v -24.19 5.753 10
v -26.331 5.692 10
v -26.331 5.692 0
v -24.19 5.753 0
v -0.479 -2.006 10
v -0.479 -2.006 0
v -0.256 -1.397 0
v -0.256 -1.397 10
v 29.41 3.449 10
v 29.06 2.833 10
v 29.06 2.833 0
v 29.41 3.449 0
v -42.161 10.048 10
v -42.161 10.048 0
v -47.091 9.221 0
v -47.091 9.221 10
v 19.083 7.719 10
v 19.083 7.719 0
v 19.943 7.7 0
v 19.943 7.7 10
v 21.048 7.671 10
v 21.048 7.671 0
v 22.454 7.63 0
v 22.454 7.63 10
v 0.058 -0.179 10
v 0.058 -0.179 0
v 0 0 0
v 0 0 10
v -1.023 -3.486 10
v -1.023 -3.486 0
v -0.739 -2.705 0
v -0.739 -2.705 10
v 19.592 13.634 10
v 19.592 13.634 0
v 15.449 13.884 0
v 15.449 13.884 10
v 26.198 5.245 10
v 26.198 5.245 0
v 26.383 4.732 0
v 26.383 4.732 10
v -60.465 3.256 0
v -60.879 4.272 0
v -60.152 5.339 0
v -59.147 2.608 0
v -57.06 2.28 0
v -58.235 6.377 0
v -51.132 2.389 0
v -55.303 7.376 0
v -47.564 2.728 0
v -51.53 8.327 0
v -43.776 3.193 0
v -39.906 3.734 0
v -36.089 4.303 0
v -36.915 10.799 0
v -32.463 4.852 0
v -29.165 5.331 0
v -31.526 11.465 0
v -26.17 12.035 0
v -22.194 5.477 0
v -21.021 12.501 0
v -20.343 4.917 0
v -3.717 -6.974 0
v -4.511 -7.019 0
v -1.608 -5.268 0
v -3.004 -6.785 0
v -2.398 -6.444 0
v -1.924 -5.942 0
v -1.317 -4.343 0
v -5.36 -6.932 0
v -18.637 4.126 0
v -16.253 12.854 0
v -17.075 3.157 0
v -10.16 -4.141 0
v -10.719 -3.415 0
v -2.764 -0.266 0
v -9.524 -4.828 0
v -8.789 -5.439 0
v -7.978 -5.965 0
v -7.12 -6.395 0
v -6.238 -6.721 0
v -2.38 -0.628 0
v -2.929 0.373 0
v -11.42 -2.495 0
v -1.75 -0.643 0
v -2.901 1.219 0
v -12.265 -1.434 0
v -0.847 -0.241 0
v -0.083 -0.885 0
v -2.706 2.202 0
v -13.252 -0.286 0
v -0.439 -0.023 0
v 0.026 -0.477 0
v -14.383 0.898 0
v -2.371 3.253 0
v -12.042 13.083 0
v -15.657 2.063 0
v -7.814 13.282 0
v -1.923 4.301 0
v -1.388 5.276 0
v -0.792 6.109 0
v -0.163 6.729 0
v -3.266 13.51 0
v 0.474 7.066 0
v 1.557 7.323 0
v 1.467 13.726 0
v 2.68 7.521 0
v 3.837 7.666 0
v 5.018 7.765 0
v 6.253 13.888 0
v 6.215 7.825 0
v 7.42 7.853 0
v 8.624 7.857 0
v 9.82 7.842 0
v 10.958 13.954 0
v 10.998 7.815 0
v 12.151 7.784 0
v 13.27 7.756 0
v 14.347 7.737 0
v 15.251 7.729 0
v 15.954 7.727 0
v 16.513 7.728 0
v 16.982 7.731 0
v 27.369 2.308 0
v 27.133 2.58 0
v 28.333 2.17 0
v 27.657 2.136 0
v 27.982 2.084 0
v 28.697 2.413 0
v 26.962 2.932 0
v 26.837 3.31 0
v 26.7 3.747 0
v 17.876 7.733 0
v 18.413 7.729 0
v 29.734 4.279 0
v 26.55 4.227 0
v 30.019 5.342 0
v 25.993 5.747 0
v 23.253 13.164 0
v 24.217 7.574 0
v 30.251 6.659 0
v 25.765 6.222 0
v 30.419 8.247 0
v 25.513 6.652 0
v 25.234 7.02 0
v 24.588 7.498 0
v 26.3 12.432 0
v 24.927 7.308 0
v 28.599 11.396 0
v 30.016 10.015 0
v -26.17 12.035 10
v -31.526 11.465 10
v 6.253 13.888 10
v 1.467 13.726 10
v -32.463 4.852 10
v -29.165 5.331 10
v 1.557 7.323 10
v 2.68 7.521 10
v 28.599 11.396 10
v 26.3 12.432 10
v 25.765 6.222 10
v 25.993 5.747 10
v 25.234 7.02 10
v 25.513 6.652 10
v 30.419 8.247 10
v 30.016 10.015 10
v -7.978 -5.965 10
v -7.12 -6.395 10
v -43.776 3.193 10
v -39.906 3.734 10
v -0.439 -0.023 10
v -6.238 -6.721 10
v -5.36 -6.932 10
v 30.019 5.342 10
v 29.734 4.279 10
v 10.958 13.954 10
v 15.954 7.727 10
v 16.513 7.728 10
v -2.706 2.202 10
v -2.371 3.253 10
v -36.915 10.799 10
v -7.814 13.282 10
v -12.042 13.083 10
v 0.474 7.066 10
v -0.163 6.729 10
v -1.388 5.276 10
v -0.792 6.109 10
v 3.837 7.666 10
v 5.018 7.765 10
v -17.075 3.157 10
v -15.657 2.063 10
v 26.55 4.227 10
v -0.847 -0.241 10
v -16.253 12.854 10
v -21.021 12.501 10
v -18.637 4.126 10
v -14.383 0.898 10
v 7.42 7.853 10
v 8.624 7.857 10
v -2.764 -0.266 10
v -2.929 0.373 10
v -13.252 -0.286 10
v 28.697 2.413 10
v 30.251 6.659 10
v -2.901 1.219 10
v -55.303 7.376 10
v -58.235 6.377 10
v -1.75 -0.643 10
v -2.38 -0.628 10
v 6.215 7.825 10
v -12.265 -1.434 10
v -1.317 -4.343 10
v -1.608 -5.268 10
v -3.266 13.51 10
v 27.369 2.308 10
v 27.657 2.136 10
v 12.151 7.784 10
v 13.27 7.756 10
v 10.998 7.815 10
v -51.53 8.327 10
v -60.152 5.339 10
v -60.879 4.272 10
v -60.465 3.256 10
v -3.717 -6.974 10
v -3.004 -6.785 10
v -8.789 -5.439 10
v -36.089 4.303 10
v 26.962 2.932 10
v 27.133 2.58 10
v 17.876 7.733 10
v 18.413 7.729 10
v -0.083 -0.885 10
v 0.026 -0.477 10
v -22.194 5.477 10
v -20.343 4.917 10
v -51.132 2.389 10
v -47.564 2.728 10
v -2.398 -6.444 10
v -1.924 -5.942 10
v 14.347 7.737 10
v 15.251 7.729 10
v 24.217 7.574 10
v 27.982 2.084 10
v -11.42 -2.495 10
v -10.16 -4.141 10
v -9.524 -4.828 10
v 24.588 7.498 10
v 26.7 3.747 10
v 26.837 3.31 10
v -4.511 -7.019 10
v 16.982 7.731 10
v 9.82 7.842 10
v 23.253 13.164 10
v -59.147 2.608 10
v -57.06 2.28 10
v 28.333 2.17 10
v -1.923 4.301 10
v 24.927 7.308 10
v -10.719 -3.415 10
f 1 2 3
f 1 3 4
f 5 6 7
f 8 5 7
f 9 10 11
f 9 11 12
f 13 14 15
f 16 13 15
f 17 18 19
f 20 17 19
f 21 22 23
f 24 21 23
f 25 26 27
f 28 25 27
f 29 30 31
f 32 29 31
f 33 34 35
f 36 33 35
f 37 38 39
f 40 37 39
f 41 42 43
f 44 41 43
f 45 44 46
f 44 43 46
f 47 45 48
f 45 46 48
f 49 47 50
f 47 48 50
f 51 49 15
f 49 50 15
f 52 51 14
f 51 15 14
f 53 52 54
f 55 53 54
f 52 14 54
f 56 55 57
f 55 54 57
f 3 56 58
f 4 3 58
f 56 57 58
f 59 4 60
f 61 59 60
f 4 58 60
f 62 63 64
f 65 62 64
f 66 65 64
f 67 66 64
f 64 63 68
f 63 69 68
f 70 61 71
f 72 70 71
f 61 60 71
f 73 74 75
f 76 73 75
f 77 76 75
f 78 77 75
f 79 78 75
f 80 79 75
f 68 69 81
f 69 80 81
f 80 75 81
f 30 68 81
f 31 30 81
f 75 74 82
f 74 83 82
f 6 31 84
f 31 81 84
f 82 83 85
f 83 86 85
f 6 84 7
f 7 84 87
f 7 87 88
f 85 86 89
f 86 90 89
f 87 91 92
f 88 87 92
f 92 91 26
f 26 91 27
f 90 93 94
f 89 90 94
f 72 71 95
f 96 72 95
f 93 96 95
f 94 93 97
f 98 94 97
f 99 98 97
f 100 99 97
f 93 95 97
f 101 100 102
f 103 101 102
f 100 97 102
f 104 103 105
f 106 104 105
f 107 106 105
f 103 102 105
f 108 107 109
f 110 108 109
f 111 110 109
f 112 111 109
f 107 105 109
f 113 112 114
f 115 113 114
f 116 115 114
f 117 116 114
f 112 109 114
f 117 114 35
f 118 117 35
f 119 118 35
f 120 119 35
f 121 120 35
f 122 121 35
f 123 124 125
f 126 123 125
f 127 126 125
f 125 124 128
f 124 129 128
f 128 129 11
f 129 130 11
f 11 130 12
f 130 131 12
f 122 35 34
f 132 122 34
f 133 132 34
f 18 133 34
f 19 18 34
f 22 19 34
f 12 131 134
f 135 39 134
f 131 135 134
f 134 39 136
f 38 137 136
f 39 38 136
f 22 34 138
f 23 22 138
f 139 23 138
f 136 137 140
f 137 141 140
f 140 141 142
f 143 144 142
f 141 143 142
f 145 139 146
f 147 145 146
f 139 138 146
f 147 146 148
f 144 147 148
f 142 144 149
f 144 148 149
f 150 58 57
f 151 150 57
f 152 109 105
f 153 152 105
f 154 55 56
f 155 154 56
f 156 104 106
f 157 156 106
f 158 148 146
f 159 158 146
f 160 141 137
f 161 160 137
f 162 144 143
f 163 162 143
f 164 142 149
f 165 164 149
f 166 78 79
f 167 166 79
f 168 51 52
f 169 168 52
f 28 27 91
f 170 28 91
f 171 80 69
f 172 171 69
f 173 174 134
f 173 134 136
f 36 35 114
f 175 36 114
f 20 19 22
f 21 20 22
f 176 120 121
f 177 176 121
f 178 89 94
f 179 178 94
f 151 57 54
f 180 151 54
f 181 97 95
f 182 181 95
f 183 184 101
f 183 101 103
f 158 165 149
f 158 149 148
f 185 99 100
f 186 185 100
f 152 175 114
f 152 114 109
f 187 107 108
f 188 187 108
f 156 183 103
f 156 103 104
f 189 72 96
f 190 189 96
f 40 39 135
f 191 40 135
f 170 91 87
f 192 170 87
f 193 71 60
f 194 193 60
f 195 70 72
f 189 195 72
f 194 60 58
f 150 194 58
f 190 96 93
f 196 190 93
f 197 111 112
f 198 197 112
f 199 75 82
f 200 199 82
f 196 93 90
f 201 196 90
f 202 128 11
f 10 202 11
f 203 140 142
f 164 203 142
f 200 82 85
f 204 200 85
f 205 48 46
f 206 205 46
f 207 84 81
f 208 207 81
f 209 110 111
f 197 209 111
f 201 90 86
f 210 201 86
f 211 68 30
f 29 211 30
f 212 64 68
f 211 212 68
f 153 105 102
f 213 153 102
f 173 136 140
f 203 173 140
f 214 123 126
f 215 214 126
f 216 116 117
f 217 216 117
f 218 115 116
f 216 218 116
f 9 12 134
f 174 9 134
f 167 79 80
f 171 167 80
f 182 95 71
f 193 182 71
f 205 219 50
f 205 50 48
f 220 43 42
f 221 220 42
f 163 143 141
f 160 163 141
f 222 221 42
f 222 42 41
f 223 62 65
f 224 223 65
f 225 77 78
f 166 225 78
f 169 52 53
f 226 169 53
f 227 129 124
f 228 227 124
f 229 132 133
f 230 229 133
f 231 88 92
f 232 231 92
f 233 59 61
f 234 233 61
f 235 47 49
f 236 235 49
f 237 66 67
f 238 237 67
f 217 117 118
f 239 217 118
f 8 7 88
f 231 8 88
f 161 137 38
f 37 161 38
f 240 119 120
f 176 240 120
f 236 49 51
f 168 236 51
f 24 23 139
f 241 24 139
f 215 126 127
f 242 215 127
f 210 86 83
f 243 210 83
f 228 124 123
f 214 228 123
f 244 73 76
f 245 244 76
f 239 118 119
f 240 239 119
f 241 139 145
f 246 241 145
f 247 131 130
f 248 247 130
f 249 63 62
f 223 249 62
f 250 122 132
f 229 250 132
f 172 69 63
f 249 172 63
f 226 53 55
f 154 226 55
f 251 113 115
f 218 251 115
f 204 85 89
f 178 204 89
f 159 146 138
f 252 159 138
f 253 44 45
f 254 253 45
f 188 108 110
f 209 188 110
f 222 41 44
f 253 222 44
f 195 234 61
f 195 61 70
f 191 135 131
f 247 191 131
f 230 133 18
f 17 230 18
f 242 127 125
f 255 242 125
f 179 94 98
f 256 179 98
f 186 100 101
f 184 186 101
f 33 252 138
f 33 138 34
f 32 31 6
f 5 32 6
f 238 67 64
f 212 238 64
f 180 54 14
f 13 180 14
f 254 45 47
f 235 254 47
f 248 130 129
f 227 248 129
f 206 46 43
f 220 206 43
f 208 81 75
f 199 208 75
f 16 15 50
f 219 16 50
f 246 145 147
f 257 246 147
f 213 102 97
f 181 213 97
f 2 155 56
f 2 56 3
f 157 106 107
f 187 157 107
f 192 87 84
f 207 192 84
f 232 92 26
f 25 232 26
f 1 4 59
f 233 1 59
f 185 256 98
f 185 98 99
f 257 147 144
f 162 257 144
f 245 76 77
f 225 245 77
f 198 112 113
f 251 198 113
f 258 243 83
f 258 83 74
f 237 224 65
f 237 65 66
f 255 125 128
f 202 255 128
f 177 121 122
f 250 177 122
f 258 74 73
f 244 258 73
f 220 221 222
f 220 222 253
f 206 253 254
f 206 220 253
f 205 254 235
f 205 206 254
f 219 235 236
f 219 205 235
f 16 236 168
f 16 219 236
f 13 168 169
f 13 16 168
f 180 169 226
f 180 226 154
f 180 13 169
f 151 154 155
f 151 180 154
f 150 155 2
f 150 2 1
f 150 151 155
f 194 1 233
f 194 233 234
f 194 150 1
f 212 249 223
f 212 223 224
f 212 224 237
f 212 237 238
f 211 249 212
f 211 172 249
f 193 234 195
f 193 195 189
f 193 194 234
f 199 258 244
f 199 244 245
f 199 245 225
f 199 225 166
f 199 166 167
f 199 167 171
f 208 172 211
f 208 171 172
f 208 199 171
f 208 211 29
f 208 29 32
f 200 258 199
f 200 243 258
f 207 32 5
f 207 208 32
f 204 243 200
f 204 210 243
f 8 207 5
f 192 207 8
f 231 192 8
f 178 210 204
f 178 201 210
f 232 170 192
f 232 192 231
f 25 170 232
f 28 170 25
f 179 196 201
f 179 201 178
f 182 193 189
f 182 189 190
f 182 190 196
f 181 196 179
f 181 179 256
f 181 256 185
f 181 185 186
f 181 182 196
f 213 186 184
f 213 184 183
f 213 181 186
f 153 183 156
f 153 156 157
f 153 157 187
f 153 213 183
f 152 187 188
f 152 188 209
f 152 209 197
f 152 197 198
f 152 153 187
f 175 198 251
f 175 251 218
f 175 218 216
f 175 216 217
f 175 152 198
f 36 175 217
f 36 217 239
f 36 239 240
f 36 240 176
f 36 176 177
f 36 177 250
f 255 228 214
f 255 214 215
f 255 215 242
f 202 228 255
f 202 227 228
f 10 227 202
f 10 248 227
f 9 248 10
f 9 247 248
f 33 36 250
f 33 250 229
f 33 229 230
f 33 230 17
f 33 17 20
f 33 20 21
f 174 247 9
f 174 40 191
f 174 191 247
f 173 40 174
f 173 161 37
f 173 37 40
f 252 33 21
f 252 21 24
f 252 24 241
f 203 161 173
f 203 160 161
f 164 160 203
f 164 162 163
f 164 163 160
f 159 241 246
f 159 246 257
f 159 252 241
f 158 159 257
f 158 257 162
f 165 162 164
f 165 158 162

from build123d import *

# Parameters (mm, degrees)
F1_DEPTH = 10


with BuildPart() as f1:
    # F0 (on Top) → F1 (new body)
    with BuildSketch(Plane.XY):
        Polygon((-55.302736, 7.375862), (-58.234972, 6.376695), (-60.152077, 5.339073), (-60.879436, 4.272422), (-60.465326, 3.256186), (-59.146603, 2.608351), (-57.060198, 2.280282), (-51.132099, 2.388886), (-47.564265, 2.728284), (-43.776487, 3.192897), (-39.9057, 3.734085), (-36.088835, 4.303211), (-32.462829, 4.851638), (-29.16461, 5.330727), (-26.331116, 5.691841), (-24.190234, 5.753123), (-22.194411, 5.477108), (-20.343403, 4.916947), (-18.636961, 4.125795), (-17.074837, 3.156806), (-15.656783, 2.063133), (-14.382549, 0.897931), (-13.251887, -0.285646), (-12.26455, -1.434445), (-11.420288, -2.495312), (-10.718854, -3.415091), (-10.159999, -4.140631), (-9.524376, -4.828129), (-8.788524, -5.439376), (-7.97831, -5.964872), (-7.119602, -6.395116), (-6.238268, -6.720607), (-5.360175, -6.931844), (-4.511192, -7.019325), (-3.717186, -6.97355), (-3.004025, -6.785017), (-2.397576, -6.444227), (-1.923709, -5.941677), (-1.60829, -5.267867), (-1.316886, -4.342745), (-1.022677, -3.48605), (-0.73894, -2.704866), (-0.478953, -2.006273), (-0.255994, -1.397351), (-0.083341, -0.885182), (0.025728, -0.476847), (0.057934, -0.179426), (0, 0), (-0.439399, -0.023458), (-0.847422, -0.240503), (-1.750059, -0.642884), (-2.380218, -0.628156), (-2.764398, -0.266297), (-2.929102, 0.372723), (-2.900829, 1.21893), (-2.706082, 2.202353), (-2.371363, 3.253021), (-1.923173, 4.300961), (-1.388014, 5.276201), (-0.792387, 6.108769), (-0.162794, 6.728694), (0.474264, 7.066004), (1.556662, 7.323265), (2.680252, 7.520912), (3.8367, 7.665848), (5.017661, 7.764977), (6.214798, 7.825203), (7.41977, 7.853431), (8.624236, 7.856563), (9.819855, 7.841504), (10.998289, 7.815158), (12.151196, 7.784429), (13.270234, 7.75622), (14.347066, 7.737436), (15.250982, 7.729441), (15.954305, 7.727012), (16.512773, 7.72817), (16.982119, 7.730942), (17.876389, 7.733422), (18.412779, 7.72918), (19.082985, 7.718649), (19.942745, 7.699855), (21.047785, 7.670821), (22.453844, 7.629573), (24.216658, 7.574135), (24.588085, 7.498381), (24.926546, 7.307823), (25.234154, 7.019938), (25.513015, 6.652199), (25.765228, 6.222079), (25.992907, 5.747053), (26.198155, 5.244594), (26.383079, 4.732176), (26.549778, 4.227272), (26.700369, 3.747357), (26.836949, 3.309903), (26.961631, 2.932385), (27.13333, 2.579536), (27.369267, 2.30779), (27.656524, 2.13622), (27.982178, 2.083901), (28.333305, 2.169907), (28.696983, 2.413315), (29.060288, 2.833197), (29.410294, 3.44863), (29.734078, 4.278687), (30.01872, 5.342444), (30.251293, 6.658976), (30.418883, 8.247355), (30.016276, 10.015402), (28.598833, 11.396484), (26.299964, 12.432229), (23.253067, 13.164268), (19.591554, 13.634228), (15.448823, 13.883739), (10.958283, 13.954428), (6.253337, 13.887925), (1.467391, 13.725859), (-3.266151, 13.509857), (-7.813885, 13.281547), (-12.042406, 13.08256), (-16.253359, 12.853671), (-21.020672, 12.501489), (-26.169738, 12.035443), (-31.525944, 11.464957), (-36.914683, 10.799458), (-42.161341, 10.048373), (-47.09131, 9.221129), (-51.529978, 8.327149), align=None)
    extrude(amount=F1_DEPTH)


solid = f1.part
